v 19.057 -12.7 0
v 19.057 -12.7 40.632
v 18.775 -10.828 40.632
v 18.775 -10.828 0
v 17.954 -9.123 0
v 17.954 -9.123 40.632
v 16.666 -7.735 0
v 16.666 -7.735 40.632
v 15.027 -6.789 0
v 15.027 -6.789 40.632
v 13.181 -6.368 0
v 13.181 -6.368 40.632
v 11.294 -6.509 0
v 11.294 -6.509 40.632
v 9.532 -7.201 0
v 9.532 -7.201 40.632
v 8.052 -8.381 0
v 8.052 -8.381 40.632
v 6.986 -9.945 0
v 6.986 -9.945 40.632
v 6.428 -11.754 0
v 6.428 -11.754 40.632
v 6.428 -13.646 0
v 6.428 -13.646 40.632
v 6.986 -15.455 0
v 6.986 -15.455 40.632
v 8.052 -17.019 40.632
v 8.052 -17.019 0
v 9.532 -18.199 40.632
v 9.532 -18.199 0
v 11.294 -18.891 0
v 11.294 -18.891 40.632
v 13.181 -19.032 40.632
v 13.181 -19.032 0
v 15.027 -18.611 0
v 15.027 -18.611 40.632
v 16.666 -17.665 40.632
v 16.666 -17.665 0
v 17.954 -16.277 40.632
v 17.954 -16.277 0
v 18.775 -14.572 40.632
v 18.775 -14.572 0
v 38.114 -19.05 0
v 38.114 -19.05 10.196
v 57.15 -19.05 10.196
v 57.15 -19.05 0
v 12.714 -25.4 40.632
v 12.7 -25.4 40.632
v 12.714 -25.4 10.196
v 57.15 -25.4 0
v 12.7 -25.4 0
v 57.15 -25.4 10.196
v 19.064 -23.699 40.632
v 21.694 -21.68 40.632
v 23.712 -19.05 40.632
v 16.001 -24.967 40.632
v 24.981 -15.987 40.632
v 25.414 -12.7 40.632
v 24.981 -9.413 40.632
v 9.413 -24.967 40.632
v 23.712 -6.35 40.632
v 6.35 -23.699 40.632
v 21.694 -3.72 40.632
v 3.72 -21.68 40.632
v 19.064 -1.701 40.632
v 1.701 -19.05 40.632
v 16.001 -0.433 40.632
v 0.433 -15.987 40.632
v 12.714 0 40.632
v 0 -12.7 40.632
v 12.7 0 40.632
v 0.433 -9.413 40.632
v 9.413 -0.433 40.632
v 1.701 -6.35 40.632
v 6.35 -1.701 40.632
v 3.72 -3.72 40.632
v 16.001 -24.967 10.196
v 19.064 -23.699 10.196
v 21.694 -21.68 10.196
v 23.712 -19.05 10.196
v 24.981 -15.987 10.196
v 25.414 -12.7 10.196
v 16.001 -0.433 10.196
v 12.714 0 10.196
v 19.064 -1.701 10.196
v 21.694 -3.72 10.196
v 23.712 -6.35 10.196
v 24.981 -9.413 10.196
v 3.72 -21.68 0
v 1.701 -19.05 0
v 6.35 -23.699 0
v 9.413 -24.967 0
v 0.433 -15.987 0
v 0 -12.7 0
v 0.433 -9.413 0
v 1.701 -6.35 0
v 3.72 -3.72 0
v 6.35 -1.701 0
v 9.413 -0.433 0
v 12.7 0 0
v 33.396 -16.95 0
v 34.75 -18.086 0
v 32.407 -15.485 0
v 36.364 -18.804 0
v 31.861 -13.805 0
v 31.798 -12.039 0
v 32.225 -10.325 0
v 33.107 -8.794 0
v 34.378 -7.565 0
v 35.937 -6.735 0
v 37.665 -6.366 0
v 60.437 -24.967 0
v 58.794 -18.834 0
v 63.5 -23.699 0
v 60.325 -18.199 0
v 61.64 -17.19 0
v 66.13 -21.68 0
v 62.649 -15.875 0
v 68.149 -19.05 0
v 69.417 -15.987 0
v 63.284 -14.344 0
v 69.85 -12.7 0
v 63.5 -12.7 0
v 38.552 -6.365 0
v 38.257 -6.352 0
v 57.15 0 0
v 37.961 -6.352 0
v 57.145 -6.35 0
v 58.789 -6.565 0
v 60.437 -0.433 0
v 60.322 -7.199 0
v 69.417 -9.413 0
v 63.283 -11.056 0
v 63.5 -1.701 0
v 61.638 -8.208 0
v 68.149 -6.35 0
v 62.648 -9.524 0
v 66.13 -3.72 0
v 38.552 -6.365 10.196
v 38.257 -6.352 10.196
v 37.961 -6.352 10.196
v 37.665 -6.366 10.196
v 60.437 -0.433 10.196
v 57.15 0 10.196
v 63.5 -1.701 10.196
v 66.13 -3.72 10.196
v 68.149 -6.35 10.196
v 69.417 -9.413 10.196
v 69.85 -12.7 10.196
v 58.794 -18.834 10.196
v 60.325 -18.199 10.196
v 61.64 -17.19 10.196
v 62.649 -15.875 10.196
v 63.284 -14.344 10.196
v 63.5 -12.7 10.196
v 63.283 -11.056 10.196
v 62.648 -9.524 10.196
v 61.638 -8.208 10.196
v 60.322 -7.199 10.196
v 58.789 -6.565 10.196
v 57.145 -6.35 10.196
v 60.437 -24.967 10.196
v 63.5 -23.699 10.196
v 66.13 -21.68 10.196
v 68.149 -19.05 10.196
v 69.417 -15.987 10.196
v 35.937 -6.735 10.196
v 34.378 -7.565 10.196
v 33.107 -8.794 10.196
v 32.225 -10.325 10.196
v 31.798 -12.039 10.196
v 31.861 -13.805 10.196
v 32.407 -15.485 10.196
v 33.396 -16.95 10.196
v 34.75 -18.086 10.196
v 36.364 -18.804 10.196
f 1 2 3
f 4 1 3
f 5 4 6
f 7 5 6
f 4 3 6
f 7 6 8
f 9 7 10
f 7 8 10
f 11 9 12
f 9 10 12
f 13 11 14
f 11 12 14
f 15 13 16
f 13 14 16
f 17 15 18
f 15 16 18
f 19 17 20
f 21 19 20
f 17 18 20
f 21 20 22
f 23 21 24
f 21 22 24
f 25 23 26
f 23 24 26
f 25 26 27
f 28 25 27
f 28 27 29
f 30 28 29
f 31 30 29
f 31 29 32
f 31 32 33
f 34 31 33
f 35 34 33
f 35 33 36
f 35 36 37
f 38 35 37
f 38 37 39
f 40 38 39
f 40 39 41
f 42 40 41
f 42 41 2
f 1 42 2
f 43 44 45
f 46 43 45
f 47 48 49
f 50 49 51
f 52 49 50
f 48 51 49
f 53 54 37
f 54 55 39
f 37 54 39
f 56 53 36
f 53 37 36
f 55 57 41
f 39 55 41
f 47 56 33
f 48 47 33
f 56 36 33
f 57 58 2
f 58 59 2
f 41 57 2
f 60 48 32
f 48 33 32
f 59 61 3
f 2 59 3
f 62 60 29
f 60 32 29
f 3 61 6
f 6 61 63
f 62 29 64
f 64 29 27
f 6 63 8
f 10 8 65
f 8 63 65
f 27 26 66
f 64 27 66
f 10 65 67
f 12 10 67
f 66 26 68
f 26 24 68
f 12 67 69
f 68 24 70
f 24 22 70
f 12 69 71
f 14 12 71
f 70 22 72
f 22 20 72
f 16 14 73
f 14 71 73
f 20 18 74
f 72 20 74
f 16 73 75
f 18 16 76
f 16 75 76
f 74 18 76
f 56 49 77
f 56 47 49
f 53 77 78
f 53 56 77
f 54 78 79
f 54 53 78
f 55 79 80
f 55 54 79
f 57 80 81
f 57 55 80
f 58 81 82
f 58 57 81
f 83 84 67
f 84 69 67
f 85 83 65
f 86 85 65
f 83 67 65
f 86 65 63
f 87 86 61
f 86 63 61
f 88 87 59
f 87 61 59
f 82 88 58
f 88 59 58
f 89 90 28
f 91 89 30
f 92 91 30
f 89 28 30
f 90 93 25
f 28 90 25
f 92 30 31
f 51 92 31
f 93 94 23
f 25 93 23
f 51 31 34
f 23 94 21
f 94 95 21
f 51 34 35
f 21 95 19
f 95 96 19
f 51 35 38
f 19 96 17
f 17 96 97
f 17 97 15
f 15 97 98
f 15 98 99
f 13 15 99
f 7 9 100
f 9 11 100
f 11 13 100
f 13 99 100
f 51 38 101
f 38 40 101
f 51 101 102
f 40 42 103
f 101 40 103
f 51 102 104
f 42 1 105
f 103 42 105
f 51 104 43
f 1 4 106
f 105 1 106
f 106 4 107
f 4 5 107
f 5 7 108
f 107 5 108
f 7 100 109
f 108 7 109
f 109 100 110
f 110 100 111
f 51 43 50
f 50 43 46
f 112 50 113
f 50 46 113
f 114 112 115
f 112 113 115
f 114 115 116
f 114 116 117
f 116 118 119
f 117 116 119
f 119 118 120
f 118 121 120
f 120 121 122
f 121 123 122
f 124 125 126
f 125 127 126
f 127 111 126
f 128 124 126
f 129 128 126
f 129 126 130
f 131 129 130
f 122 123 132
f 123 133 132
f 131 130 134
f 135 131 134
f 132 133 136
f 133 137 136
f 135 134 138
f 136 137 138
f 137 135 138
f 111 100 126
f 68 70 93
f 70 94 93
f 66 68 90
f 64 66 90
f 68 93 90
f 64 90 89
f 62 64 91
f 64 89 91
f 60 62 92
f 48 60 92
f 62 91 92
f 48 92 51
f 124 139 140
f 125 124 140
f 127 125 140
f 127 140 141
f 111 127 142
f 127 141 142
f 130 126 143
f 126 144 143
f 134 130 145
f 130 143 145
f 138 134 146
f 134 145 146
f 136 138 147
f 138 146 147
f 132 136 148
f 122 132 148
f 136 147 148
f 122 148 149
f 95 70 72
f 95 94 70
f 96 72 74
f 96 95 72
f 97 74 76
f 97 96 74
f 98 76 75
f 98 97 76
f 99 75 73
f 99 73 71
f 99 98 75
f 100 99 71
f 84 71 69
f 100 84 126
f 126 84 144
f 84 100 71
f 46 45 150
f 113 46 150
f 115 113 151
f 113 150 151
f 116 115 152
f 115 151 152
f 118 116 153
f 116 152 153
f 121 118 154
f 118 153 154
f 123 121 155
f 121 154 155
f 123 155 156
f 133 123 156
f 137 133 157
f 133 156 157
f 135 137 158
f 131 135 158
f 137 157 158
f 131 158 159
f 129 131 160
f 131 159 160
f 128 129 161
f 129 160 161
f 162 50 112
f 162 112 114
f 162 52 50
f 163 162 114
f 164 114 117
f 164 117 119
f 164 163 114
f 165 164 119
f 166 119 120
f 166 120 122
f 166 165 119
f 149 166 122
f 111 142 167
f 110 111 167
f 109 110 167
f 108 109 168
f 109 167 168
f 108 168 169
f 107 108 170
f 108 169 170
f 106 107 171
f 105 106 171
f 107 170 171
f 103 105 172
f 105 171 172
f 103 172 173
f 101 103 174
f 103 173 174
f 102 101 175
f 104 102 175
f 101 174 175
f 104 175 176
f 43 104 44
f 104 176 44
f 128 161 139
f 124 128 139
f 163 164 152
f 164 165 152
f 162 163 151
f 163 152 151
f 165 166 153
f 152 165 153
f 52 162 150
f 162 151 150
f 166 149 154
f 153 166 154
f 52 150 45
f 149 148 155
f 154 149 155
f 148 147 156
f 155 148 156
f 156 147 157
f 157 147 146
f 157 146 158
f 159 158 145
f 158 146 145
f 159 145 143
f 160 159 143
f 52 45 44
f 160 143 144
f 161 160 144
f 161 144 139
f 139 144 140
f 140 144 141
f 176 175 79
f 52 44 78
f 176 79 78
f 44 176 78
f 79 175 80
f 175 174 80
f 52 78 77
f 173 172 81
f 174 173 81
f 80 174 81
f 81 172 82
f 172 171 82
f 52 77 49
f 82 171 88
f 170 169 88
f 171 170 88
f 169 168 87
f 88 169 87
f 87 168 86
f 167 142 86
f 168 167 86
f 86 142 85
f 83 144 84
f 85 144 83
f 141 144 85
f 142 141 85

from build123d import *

# Parameters (mm, degrees)
F1_DEPTH = 25.4
F2_R     = 6.35
F3_DEPTH = 50.8
F4_R     = 12.69999
F6_DEPTH = 25.4


# Not quite as in the source:
# - a fillet or chamfer is up to 0.001 mm smaller than in the source, because OpenCascade refuses the exact size


with BuildPart() as f1:
    # F0 (on Front) → F1 (new body)
    with BuildSketch(Plane.XZ):
        Polygon((0, 40.6317008091), (0, 0), (69.85, 0), (69.85, 10.1959701541), (25.413833983, 10.1959701541), (25.413833983, 40.6317008091), align=None)
    extrude(amount=F1_DEPTH)

    # F2 (on face) → F3 (cut)
    with BuildSketch(Plane.XY.offset(40.6317008091)):
        with Locations((12.7069169915, -12.7)):
            Circle(F2_R)
    extrude(amount=-F3_DEPTH, mode=Mode.SUBTRACT)

    # F4 (radius 12.7 in the source; OpenCascade refuses exactly that, so slightly less here)
    f4_edges = [f1.edges().sort_by_distance(p)[0] for p in [
        (25.413834, -25.4, 25.413835),
        (25.413834, 0, 25.413835),
        (0, -25.4, 20.31585),
        (0, 0, 20.31585),
        (69.85, -25.4, 5.097985),
        (69.85, 0, 5.097985),
    ]]
    fillet(f4_edges, radius=F4_R)

    # F5 (on face) → F6 (cut)
    with BuildSketch(Plane.XY.offset(10.1959701541)):
        with BuildLine():
            Line((38.5519873755, -6.3651344446), (37.6653695389, -6.365856045))
            ThreePointArc((37.6653695389, -6.365856045), (31.7677992323, -12.9243723311), (38.113833983, -19.05))
            ThreePointArc((38.113833983, -19.05), (42.6039620435, -17.1901280605), (44.463833983, -12.7))
            ThreePointArc((44.463833983, -12.7), (42.7562888316, -8.3675511568), (38.5519873755, -6.3651344446))
        make_face()
        with BuildLine():
            ThreePointArc((38.5519873755, -6.3651344446), (38.1086658476, -6.3500021031), (37.6653695389, -6.365856045))
            Line((37.6653695389, -6.365856045), (38.5519873755, -6.3651344446))
        make_face()
        with BuildLine():
            ThreePointArc((44.463833983, -12.7), (42.6039620435, -17.1901280605), (38.113833983, -19.05))
            Line((38.113833983, -19.05), (57.15, -19.05))
            ThreePointArc((57.15, -19.05), (50.8000005258, -12.7025840679), (57.1448318647, -6.3500021031))
            Line((57.1448318647, -6.3500021031), (38.5519873755, -6.3651344446))
            ThreePointArc((38.5519873755, -6.3651344446), (42.7562888316, -8.3675511568), (44.463833983, -12.7))
        make_face()
        with BuildLine():
            ThreePointArc((57.1448318647, -6.3500021031), (50.8000005258, -12.7025840679), (57.15, -19.05))
            ThreePointArc((57.15, -19.05), (61.6401280605, -17.1901280605), (63.5, -12.7))
            ThreePointArc((63.5, -12.7), (61.6383004768, -8.2080450993), (57.1448318647, -6.3500021031))
        make_face()
    extrude(amount=-F6_DEPTH, mode=Mode.SUBTRACT)


solid = f1.part
